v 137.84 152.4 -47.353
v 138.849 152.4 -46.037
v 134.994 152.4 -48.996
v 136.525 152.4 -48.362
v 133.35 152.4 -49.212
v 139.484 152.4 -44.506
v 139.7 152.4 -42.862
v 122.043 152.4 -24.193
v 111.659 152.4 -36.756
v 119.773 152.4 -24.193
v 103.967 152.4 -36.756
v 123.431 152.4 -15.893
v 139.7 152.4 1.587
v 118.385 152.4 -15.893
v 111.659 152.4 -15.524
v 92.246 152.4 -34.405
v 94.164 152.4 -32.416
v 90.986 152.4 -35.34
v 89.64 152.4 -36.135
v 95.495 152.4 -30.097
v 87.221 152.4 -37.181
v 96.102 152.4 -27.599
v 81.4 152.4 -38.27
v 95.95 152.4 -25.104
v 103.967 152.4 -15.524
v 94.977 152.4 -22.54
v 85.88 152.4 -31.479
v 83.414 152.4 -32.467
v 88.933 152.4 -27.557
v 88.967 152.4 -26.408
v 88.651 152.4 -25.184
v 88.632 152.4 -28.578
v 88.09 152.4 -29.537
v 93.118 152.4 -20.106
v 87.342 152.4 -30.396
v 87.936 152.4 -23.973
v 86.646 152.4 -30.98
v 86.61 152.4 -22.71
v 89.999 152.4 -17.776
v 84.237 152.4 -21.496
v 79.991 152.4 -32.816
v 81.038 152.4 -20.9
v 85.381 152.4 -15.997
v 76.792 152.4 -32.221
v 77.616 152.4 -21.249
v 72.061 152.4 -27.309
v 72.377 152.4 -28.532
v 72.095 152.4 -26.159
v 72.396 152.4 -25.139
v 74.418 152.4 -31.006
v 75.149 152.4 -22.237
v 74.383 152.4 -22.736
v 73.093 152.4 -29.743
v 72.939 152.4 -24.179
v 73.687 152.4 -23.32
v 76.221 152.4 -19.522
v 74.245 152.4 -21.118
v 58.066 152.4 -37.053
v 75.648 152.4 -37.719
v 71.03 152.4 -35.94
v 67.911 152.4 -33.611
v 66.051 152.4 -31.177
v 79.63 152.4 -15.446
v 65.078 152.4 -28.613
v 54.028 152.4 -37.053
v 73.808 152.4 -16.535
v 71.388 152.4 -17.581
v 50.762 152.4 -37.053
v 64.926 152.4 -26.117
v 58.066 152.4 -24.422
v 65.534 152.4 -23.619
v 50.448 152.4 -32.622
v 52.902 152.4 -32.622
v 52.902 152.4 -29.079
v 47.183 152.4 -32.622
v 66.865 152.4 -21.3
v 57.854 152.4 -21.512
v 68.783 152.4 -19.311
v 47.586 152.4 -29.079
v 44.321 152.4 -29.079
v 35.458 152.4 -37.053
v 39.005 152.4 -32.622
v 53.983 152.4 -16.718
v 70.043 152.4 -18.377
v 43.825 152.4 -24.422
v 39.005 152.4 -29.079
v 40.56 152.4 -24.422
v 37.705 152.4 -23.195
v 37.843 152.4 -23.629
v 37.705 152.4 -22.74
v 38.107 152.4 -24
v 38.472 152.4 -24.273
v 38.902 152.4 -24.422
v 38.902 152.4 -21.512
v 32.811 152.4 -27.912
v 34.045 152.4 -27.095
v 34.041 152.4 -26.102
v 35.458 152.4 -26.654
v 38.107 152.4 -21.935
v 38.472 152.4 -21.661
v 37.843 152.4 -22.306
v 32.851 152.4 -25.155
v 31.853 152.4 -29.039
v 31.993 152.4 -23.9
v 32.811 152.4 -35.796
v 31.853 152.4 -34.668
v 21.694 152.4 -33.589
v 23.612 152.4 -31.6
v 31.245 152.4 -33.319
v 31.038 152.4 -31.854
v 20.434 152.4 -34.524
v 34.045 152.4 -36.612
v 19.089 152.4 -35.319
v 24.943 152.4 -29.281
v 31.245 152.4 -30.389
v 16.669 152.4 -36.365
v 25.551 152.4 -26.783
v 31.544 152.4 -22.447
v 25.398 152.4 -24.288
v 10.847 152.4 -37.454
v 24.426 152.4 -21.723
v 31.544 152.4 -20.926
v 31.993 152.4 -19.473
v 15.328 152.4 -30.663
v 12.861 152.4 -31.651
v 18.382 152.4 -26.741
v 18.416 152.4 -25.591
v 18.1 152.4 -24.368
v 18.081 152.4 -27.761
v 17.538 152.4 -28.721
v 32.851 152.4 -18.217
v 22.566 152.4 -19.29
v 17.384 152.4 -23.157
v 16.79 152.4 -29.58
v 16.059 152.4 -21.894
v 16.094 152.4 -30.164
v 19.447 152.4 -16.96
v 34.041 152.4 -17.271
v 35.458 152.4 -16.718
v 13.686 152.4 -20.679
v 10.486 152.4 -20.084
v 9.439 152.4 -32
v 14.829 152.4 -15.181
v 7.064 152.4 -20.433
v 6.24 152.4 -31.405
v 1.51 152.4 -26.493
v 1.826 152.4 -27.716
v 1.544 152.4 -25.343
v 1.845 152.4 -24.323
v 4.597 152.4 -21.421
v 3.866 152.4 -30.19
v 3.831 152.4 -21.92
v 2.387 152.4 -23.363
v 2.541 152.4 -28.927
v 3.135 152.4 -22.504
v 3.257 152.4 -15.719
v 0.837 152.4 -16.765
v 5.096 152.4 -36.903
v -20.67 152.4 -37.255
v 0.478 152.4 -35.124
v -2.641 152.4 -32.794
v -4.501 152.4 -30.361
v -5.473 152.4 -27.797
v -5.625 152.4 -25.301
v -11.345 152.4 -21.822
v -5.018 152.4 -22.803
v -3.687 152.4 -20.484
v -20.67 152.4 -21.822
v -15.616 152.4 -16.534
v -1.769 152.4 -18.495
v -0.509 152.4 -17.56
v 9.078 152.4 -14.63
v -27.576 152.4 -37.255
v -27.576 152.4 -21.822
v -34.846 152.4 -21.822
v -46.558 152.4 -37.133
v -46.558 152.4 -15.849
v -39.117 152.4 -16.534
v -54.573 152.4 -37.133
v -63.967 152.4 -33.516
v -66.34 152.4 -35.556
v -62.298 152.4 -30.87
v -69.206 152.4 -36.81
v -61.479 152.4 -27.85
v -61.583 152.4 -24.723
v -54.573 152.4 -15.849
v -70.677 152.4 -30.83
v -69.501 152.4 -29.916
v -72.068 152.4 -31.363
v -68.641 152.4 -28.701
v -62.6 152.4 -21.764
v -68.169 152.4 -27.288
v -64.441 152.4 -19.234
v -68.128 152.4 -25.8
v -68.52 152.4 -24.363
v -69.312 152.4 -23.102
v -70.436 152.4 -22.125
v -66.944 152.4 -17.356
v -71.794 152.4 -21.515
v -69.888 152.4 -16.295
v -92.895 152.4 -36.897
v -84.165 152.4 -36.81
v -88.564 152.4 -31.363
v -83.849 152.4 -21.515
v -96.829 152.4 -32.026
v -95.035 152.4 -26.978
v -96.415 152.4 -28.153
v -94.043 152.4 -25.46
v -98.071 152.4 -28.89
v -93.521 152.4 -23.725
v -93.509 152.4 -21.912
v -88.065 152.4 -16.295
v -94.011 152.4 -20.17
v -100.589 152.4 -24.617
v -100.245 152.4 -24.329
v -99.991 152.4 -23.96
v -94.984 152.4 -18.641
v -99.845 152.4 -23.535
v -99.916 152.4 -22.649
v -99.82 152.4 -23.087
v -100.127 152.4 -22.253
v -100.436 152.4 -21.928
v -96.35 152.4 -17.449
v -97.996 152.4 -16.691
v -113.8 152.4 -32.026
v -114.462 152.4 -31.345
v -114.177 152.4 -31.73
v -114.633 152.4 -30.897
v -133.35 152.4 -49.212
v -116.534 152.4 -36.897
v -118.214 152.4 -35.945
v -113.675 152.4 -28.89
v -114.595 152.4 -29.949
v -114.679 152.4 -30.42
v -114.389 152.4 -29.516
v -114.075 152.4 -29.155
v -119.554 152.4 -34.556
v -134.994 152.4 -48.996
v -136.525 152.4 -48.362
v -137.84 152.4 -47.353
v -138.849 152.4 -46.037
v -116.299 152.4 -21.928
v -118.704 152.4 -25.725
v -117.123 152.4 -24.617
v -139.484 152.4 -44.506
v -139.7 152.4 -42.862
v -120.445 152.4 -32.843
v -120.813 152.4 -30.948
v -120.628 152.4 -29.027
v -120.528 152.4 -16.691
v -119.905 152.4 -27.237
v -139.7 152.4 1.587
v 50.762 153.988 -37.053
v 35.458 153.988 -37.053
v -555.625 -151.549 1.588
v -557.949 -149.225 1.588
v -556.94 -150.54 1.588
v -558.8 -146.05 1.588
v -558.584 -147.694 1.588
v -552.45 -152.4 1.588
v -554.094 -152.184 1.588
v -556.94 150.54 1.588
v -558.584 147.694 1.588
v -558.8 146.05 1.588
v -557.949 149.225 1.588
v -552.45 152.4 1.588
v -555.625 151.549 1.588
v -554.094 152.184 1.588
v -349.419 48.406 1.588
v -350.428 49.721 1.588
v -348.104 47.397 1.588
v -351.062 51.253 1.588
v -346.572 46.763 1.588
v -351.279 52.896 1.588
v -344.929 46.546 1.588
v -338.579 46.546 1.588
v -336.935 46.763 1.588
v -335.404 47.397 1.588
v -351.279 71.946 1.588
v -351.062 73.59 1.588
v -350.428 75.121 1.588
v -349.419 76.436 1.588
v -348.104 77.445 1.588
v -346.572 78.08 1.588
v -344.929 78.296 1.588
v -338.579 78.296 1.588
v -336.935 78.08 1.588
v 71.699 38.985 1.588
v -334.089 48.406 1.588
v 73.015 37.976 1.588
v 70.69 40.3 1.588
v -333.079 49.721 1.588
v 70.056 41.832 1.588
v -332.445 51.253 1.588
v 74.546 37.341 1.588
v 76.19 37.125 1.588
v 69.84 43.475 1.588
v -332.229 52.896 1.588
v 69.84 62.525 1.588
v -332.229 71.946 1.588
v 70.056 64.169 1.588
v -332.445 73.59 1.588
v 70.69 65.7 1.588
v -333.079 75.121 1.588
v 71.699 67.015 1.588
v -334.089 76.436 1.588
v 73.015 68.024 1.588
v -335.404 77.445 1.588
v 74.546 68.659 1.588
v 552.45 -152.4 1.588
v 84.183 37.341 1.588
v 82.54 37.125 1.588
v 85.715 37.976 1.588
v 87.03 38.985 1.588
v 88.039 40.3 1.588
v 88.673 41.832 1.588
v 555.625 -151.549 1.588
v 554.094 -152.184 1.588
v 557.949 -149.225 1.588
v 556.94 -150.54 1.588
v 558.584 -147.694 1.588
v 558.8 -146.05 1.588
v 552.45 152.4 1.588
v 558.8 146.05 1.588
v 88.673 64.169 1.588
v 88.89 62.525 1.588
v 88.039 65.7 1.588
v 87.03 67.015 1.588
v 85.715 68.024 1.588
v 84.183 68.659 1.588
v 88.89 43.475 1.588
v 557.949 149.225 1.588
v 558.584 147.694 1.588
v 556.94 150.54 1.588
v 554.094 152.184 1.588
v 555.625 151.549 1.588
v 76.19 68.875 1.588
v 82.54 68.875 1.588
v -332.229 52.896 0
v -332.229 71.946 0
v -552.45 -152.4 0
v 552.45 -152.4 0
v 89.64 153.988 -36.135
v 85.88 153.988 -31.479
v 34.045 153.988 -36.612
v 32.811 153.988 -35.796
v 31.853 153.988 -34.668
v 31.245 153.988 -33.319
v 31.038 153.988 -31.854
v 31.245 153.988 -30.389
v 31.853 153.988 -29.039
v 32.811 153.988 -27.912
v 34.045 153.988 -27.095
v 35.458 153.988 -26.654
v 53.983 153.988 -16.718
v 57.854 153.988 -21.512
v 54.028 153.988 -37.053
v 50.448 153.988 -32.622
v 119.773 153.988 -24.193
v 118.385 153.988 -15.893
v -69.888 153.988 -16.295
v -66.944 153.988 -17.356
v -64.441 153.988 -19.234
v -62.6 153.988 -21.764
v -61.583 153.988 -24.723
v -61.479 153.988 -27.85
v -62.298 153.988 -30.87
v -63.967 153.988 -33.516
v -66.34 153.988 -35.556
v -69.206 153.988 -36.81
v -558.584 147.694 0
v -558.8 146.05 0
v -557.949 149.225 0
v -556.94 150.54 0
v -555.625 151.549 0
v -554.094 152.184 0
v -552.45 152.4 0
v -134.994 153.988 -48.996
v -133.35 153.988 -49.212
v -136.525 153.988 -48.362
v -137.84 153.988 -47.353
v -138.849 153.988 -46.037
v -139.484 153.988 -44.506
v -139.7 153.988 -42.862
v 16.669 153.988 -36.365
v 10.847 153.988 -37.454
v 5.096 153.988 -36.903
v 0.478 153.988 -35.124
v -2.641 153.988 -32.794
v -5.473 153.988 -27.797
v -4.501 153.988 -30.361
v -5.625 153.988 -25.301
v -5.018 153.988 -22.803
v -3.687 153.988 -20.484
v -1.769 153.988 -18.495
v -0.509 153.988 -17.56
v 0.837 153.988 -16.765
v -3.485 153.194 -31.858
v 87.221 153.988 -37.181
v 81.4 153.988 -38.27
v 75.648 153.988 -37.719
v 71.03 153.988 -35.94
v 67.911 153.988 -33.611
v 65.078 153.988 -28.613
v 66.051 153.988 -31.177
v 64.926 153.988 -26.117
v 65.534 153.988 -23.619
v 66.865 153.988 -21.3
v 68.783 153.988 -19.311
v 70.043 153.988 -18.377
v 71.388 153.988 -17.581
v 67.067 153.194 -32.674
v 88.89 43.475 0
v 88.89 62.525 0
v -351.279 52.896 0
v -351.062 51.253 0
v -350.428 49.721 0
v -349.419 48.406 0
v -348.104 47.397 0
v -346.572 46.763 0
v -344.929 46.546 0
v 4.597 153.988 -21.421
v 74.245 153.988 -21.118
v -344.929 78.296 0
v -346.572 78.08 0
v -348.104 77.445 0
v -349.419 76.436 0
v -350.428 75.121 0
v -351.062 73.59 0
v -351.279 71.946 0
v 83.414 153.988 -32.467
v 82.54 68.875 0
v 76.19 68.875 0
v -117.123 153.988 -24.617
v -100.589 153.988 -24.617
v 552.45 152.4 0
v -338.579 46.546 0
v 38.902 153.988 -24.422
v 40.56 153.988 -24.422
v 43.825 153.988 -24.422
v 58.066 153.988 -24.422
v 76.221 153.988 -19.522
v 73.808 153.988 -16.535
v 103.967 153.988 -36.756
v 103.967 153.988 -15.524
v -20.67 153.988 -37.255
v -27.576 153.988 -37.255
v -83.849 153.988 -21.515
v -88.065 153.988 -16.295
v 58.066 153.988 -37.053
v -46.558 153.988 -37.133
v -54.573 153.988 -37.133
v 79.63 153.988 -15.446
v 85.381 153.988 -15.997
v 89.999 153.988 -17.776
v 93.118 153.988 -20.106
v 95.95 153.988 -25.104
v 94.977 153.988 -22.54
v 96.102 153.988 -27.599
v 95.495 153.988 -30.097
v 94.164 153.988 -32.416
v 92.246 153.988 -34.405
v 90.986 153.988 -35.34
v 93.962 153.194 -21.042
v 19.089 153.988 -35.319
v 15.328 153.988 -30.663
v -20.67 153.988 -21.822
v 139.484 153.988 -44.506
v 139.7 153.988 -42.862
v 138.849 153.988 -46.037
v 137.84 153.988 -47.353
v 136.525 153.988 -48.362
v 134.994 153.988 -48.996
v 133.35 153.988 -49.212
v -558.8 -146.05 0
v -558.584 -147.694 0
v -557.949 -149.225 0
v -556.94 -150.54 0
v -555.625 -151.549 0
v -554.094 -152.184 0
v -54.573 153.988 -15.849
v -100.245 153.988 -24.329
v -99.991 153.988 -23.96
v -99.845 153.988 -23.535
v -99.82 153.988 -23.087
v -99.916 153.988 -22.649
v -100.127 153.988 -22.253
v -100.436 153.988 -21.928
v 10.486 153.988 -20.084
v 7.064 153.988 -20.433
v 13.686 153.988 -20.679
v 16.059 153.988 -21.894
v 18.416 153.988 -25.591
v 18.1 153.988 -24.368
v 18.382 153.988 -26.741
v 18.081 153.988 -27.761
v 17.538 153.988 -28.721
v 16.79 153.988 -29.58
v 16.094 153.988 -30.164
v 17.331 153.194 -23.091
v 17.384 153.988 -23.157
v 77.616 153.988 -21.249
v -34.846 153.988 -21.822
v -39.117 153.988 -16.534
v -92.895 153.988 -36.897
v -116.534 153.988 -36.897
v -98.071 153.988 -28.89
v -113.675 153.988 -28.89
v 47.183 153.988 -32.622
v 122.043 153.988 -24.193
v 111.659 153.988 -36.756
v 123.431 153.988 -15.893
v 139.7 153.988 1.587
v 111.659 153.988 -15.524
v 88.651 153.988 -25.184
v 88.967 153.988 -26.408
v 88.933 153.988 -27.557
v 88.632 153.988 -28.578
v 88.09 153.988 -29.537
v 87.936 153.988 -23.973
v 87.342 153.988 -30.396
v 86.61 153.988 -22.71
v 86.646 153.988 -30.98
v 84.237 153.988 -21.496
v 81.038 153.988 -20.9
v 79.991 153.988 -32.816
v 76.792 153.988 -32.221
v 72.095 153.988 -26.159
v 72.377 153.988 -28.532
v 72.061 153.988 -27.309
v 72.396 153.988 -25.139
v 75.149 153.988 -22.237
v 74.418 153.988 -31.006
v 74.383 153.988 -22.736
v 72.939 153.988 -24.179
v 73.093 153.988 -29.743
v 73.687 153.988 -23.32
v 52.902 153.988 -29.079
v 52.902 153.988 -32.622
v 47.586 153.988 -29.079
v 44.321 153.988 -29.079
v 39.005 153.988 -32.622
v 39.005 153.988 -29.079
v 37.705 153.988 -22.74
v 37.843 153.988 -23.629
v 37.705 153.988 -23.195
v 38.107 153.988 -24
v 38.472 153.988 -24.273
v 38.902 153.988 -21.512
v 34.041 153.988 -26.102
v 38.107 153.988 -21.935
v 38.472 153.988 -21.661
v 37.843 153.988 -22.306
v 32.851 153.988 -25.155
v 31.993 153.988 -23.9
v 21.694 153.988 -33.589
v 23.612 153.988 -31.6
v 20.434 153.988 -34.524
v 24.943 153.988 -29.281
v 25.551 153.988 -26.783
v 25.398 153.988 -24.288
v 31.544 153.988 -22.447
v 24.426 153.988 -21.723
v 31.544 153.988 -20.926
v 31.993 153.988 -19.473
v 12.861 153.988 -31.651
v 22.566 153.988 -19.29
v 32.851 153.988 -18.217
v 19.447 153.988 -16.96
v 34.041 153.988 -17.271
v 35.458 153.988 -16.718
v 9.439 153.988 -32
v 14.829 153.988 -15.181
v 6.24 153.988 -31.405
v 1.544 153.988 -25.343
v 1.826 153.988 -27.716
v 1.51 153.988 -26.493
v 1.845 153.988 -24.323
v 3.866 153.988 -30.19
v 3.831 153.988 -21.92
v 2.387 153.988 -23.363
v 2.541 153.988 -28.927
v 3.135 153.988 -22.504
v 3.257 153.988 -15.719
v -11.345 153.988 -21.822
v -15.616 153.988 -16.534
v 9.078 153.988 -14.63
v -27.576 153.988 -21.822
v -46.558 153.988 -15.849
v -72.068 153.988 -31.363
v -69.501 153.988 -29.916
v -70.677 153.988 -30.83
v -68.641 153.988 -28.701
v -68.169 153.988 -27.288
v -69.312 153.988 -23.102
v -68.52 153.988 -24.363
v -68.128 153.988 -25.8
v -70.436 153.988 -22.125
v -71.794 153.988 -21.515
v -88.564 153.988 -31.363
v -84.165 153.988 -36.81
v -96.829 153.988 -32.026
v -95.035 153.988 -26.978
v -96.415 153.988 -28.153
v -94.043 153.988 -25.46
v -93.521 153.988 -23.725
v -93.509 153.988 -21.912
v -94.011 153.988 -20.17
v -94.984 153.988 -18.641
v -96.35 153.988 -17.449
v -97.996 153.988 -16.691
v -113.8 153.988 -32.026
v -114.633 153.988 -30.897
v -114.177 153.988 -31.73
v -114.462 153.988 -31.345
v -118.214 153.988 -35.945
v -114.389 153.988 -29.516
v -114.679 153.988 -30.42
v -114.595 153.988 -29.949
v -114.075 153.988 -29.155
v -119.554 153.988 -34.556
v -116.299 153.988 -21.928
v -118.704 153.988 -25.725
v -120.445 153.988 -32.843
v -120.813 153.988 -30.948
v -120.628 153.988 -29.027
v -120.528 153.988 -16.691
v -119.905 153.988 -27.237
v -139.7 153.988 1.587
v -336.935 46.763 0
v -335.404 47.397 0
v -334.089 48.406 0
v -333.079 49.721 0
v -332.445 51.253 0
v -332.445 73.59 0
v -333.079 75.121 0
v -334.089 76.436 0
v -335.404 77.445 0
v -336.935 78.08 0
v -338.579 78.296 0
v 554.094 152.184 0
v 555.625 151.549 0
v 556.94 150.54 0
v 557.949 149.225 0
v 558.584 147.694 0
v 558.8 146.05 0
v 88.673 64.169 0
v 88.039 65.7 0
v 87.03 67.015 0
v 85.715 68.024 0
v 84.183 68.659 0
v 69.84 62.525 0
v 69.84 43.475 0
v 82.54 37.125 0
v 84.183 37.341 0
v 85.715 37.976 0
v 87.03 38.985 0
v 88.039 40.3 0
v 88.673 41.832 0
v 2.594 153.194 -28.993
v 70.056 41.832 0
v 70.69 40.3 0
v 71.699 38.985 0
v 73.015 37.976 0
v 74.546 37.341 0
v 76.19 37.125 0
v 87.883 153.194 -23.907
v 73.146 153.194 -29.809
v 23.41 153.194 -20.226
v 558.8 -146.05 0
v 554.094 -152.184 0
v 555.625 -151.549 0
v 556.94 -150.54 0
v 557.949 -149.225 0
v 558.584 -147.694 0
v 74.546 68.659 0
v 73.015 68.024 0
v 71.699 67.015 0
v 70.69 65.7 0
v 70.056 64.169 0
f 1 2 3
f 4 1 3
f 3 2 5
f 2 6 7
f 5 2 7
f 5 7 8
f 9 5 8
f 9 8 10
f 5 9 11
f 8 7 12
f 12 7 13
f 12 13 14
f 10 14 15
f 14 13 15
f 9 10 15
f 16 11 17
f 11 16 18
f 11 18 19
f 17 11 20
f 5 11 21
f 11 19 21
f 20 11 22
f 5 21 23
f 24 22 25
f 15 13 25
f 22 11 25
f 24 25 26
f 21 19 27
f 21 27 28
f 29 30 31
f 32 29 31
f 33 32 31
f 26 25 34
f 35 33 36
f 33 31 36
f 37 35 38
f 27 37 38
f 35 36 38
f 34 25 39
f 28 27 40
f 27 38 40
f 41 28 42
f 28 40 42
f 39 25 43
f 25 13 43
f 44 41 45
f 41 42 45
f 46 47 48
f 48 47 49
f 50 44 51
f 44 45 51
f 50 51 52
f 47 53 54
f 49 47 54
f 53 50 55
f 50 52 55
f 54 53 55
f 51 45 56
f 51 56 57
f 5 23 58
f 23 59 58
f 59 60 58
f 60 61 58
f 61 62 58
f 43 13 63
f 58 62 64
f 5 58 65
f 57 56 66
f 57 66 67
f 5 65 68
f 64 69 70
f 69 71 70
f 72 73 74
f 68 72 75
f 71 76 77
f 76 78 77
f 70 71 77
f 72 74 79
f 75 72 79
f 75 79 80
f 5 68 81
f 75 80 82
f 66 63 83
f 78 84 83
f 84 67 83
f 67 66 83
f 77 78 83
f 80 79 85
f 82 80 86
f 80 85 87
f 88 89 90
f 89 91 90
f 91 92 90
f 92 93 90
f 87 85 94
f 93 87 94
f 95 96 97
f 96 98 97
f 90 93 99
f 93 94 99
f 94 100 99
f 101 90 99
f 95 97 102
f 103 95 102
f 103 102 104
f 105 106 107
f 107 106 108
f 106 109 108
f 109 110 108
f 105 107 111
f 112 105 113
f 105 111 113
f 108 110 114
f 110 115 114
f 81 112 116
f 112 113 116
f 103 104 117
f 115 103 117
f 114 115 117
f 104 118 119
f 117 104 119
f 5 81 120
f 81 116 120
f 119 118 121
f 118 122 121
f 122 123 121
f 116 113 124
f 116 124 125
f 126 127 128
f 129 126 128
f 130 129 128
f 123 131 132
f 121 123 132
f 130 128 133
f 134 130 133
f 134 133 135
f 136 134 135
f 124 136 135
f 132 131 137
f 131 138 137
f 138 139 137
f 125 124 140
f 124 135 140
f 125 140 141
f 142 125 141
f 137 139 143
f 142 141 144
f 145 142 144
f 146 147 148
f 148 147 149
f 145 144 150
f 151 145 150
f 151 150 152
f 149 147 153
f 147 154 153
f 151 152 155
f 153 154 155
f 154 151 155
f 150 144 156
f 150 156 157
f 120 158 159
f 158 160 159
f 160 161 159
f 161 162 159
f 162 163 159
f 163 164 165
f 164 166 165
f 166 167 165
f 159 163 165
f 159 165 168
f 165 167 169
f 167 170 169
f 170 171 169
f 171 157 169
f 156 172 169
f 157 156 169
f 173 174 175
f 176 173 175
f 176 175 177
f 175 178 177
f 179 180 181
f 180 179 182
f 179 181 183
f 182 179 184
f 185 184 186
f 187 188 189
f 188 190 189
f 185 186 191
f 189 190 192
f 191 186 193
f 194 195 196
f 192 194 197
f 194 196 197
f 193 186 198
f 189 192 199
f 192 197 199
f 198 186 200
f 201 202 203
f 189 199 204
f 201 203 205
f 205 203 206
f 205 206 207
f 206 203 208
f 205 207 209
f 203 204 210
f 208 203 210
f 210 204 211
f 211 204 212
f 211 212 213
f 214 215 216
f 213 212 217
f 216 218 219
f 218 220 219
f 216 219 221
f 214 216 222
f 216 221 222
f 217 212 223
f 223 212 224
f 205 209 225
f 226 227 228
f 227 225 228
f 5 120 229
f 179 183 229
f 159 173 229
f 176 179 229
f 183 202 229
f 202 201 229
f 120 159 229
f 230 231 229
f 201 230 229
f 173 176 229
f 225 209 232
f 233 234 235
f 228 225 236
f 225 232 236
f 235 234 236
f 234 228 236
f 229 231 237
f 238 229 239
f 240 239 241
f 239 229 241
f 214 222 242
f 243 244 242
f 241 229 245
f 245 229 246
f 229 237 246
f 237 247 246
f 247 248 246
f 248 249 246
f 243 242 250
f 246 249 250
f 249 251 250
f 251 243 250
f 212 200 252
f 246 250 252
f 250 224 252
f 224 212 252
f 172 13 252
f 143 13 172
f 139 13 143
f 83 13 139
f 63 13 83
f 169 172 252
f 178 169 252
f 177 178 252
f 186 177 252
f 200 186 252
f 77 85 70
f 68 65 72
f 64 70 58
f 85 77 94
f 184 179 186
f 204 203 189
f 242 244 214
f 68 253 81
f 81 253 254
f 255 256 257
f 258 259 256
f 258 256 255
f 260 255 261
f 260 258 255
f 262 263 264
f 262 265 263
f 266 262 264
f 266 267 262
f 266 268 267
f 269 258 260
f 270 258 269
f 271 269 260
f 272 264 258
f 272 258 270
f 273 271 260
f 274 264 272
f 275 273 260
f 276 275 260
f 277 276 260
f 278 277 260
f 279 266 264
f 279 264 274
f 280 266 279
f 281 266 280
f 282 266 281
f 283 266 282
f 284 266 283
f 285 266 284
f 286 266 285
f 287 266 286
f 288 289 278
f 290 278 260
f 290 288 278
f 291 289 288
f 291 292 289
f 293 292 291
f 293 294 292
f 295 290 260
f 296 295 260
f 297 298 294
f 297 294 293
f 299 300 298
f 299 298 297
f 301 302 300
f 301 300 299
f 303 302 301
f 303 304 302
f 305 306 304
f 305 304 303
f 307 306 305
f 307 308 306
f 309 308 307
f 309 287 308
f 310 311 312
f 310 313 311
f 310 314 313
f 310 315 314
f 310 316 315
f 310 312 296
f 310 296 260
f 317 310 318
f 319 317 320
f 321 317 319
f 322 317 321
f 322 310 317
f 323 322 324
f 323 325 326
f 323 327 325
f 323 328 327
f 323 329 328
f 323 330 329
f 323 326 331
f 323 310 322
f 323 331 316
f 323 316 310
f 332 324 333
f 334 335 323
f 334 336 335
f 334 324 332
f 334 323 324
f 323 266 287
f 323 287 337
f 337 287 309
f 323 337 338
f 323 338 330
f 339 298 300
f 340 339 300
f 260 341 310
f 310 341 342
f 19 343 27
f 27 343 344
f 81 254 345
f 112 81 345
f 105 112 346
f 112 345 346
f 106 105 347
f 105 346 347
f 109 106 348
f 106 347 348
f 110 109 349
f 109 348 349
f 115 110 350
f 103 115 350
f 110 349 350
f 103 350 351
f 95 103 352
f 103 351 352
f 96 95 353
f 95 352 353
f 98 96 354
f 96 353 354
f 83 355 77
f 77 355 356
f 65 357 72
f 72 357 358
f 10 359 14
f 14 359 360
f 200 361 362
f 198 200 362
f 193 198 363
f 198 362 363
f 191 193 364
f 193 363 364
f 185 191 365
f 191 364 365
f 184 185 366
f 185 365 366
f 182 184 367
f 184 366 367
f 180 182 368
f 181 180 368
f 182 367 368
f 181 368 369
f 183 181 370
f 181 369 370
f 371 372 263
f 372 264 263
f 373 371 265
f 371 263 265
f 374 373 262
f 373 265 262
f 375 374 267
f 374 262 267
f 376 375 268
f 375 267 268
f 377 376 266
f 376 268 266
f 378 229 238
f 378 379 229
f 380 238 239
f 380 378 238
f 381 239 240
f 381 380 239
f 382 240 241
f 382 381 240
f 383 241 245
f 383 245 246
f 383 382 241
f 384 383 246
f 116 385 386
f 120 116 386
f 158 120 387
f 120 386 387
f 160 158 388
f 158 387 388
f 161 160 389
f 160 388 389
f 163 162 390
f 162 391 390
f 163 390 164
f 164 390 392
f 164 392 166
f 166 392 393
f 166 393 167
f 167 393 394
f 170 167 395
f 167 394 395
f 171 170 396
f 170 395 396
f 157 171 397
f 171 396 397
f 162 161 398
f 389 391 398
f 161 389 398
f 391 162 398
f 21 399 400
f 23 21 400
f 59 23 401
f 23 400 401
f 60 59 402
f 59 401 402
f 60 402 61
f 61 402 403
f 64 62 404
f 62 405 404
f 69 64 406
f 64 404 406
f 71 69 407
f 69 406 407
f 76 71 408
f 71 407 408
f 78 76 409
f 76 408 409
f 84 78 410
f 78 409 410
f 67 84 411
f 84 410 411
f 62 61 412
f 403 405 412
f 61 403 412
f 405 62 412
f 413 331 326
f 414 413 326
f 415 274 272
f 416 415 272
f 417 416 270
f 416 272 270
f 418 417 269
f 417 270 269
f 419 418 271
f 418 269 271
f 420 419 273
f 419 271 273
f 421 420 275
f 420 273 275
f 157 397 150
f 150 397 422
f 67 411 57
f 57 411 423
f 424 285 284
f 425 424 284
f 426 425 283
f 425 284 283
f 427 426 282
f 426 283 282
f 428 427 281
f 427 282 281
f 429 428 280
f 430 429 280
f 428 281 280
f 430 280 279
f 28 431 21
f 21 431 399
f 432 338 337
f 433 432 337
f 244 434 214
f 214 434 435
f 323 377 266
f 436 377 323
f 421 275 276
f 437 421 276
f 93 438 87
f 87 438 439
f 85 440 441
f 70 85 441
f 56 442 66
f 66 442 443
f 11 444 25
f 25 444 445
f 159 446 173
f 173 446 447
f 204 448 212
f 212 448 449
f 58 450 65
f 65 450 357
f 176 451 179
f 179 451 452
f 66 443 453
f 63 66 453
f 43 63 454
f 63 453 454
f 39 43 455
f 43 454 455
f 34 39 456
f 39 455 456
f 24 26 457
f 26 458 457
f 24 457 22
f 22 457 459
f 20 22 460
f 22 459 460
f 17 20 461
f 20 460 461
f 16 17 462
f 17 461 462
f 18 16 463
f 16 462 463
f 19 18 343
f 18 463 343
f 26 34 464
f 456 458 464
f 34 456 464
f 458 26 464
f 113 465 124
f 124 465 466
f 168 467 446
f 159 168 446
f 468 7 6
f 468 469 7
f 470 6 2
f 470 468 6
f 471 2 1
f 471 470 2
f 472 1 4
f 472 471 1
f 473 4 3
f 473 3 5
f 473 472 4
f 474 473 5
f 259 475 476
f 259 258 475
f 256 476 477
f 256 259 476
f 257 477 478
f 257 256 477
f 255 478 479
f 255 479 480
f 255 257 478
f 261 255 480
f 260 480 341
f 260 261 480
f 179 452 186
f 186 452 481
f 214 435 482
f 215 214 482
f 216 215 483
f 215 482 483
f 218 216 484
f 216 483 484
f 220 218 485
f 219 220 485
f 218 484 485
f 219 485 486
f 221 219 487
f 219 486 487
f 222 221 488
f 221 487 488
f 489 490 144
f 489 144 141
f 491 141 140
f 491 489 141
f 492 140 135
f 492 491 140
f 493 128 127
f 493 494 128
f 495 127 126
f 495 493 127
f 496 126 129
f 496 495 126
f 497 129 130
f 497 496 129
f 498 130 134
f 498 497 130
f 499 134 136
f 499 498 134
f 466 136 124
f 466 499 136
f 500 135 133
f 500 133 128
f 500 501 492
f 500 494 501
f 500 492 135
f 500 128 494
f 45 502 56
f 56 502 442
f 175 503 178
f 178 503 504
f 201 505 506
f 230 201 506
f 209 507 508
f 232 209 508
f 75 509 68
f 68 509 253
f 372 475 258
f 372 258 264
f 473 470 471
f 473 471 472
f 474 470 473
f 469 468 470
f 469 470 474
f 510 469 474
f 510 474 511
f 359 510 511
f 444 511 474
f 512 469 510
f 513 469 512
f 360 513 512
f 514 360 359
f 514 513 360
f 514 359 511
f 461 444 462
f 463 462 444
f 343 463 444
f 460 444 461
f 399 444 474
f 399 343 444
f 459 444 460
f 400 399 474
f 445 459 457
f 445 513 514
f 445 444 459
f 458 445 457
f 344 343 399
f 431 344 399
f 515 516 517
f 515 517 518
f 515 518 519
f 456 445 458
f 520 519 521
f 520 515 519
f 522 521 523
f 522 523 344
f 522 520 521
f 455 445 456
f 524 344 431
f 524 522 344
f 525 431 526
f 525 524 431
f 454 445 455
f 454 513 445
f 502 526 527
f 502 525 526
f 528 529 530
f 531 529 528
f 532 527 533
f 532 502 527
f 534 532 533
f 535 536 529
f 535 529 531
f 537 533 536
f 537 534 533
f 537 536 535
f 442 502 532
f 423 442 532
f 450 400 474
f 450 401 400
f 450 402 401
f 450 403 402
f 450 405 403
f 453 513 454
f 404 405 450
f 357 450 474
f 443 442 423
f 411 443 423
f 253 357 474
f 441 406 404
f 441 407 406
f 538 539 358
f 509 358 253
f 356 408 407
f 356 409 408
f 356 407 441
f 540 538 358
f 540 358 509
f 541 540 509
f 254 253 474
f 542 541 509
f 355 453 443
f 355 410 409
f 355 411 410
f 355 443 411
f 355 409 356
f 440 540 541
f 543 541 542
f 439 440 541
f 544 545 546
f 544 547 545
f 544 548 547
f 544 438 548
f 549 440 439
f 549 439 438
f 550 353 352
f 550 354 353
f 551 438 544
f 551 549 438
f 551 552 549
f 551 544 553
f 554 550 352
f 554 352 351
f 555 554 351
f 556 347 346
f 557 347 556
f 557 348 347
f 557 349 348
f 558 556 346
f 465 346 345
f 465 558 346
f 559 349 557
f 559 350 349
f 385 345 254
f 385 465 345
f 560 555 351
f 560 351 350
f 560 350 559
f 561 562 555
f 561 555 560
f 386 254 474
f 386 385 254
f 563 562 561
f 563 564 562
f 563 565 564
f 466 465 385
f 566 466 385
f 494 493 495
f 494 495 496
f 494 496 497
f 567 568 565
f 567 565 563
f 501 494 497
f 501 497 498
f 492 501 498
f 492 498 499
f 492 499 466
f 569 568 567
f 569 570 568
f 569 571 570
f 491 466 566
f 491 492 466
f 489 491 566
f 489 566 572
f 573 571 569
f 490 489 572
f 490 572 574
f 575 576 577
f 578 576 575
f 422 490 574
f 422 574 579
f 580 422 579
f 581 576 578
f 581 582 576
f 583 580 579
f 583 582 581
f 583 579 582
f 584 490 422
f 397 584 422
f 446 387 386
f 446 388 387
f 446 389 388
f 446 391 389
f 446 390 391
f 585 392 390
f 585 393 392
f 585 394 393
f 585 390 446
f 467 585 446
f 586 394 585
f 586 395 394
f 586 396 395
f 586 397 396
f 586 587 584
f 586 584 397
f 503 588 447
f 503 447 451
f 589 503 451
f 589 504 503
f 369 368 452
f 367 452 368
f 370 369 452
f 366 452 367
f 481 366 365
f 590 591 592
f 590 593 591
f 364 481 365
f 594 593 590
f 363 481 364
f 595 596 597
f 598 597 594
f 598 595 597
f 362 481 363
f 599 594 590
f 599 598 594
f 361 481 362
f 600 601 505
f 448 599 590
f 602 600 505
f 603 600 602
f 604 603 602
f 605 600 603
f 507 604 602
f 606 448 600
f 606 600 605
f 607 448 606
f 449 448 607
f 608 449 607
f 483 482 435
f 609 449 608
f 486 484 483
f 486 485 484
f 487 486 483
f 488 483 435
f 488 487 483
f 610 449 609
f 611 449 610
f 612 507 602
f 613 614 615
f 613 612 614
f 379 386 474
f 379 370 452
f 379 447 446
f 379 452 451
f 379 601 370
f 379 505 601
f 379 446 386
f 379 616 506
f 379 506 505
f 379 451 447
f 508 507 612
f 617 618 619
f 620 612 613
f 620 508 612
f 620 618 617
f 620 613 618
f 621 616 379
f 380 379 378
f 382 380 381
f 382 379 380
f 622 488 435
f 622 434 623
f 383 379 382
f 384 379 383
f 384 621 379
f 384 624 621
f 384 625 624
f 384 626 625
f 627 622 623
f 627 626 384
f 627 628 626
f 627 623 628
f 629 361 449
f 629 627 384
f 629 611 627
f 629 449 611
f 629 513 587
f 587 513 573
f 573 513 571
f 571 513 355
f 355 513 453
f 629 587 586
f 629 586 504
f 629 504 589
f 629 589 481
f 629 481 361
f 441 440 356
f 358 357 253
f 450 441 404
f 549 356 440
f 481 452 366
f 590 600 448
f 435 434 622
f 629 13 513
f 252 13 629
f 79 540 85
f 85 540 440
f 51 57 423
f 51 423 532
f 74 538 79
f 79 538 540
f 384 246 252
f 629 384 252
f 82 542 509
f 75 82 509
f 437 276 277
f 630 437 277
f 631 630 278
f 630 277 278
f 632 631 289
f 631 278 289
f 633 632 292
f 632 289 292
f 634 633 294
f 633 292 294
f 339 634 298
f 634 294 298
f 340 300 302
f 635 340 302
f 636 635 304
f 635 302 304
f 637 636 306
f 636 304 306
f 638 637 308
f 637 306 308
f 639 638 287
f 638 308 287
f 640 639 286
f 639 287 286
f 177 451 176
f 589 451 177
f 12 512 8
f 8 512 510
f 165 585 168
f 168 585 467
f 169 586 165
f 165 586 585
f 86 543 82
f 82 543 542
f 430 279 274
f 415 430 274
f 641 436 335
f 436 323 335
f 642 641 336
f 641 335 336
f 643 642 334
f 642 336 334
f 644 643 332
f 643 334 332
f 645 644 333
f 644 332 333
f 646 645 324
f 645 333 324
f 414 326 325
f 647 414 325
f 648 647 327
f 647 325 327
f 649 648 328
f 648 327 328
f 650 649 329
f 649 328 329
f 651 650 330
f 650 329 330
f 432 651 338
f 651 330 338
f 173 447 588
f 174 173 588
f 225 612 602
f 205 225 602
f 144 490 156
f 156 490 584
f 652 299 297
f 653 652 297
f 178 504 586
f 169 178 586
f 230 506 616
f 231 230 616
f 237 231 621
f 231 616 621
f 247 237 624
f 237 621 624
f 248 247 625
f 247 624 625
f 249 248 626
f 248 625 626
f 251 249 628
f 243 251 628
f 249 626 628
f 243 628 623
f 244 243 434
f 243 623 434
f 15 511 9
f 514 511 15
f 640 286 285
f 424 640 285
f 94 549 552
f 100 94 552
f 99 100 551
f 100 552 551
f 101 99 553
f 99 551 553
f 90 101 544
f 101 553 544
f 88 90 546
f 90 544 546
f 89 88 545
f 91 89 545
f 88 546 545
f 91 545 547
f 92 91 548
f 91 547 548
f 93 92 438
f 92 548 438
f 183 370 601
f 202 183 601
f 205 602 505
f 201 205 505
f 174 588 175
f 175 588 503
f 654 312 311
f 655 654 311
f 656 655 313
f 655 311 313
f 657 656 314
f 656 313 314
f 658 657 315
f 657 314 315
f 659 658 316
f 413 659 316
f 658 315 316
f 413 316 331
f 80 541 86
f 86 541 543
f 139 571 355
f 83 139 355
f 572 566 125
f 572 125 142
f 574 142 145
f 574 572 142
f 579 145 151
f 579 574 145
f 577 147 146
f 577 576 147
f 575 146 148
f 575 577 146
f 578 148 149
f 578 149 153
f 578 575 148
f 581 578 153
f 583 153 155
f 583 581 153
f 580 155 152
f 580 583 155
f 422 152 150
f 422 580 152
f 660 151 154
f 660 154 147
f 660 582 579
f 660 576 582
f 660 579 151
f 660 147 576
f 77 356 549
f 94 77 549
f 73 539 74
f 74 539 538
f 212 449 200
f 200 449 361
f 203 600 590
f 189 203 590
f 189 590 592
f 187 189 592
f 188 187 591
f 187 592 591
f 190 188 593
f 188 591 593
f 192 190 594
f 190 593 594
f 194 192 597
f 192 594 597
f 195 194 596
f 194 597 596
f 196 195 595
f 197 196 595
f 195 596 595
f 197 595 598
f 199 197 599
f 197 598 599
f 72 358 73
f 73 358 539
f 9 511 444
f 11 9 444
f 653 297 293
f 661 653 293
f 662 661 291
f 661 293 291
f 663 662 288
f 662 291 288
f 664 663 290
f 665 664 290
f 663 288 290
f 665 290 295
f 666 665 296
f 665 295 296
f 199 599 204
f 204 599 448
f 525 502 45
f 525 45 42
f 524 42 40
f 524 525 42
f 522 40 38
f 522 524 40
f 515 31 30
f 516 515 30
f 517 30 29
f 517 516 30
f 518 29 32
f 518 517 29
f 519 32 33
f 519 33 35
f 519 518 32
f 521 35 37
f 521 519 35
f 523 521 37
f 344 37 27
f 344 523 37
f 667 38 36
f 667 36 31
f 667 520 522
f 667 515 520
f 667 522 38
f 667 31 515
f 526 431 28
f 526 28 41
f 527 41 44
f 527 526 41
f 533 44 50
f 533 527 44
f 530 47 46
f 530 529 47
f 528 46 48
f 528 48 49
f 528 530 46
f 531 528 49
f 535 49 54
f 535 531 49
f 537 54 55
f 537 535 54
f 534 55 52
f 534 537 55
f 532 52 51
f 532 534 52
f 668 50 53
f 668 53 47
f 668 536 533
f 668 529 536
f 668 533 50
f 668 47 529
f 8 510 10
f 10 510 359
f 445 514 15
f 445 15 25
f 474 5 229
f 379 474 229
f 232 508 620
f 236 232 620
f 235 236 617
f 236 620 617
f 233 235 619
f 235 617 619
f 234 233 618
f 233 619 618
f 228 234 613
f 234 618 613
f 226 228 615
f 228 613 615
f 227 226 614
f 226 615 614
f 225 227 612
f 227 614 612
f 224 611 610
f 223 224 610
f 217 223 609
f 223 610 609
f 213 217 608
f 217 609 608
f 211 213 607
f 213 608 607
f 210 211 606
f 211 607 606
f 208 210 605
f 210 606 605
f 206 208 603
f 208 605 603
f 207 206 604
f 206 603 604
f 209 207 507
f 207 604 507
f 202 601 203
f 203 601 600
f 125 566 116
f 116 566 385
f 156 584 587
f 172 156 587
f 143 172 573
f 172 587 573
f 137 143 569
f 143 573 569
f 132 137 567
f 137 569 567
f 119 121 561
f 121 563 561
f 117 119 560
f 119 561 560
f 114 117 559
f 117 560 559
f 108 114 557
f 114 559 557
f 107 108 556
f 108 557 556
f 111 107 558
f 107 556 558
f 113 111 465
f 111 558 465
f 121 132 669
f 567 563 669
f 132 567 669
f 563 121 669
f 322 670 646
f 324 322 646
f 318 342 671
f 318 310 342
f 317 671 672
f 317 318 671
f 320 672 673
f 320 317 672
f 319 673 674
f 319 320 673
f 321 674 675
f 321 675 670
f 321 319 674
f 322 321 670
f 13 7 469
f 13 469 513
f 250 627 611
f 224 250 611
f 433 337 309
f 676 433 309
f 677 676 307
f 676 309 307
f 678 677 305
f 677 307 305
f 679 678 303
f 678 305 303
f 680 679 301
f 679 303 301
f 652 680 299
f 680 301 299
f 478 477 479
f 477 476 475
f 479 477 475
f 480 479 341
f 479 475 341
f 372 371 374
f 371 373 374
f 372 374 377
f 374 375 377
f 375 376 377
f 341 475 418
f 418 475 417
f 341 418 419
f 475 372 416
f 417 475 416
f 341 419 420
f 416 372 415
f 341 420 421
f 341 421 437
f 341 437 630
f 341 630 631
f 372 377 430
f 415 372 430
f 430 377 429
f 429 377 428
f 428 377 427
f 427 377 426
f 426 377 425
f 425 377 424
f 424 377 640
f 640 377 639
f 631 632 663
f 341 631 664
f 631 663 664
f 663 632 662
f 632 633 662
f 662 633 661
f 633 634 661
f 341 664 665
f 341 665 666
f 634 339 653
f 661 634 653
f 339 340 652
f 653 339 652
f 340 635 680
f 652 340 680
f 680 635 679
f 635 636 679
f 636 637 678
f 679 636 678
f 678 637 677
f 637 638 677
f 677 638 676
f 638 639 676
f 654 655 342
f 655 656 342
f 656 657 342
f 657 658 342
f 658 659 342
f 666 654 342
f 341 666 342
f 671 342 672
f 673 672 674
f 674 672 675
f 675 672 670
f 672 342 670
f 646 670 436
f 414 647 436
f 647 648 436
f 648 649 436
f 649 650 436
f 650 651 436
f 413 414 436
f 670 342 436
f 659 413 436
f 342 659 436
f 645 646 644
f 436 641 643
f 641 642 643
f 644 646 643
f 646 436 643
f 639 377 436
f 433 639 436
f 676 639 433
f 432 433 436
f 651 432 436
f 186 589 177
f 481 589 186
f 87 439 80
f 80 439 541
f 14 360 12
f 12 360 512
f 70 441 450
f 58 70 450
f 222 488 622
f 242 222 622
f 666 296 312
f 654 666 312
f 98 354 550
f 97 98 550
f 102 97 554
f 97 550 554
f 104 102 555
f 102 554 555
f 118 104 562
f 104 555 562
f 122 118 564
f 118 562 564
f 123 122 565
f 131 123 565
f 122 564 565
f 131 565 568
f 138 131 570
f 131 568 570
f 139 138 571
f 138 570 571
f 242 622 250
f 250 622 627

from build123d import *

# Parameters (mm, degrees)
F0_W     = 1117.6
F0_H     = 304.8
F1_DEPTH = 1.5875
F4_DEPTH = 1.5875
F5_W     = 279.4
F5_H     = 50.8
F6_DEPTH = 1.5875
F7_W     = 7.6921805739
F7_H     = 21.2329626083
F7_W_2   = 8.0148763955
F7_H_2   = 21.2832065299
F8_DEPTH = 1.5875
F9_R     = 6.35
F10_R    = 6.35


with BuildPart() as f1:
    # F0 (on Top) → F1 (new body)
    with BuildSketch(Plane.XY):
        Rectangle(F0_W, F0_H)
    extrude(amount=F1_DEPTH)

    # F3 (on face) → F4 (cut, through all)
    with BuildSketch(Plane.XY.offset(1.5875)):
        with BuildLine():
            ThreePointArc((-332.2286445189, 71.9461765826), (-334.0885164583, 76.4363046431), (-338.5786445189, 78.2961765826))
            Line((-338.5786445189, 78.2961765826), (-344.9286445189, 78.2961765826))
            ThreePointArc((-344.9286445189, 78.2961765826), (-349.4187725794, 76.4363046431), (-351.2786445189, 71.9461765826))
            Line((-351.2786445189, 71.9461765826), (-351.2786445189, 52.8961765826))
            ThreePointArc((-351.2786445189, 52.8961765826), (-349.4187725794, 48.406048522), (-344.9286445189, 46.5461765826))
            Line((-344.9286445189, 46.5461765826), (-338.5786445189, 46.5461765826))
            ThreePointArc((-338.5786445189, 46.5461765826), (-334.0885164583, 48.406048522), (-332.2286445189, 52.8961765826))
            Line((-332.2286445189, 52.8961765826), (-332.2286445189, 71.9461765826))
        make_face()
        with BuildLine():
            ThreePointArc((88.8895047712, 62.5250180006), (87.0296328318, 67.0151460611), (82.5395047712, 68.8750180006))
            Line((82.5395047712, 68.8750180006), (76.1895047712, 68.8750180006))
            ThreePointArc((76.1895047712, 68.8750180006), (71.6993767107, 67.0151460611), (69.8395047712, 62.5250180006))
            Line((69.8395047712, 62.5250180006), (69.8395047712, 43.4750180006))
            ThreePointArc((69.8395047712, 43.4750180006), (71.6993767107, 38.9848899401), (76.1895047712, 37.1250180006))
            Line((76.1895047712, 37.1250180006), (82.5395047712, 37.1250180006))
            ThreePointArc((82.5395047712, 37.1250180006), (87.0296328318, 38.9848899401), (88.8895047712, 43.4750180006))
            Line((88.8895047712, 43.4750180006), (88.8895047712, 62.5250180006))
        make_face()
    extrude(amount=-F4_DEPTH, mode=Mode.SUBTRACT)

    # F9
    f9_edges = [f1.edges().sort_by_distance(p)[0] for p in [
        (-558.8, 152.4, 0.79375),
        (-558.8, -152.4, 0.79375),
        (558.8, -152.4, 0.79375),
        (558.8, 152.4, 0.79375),
    ]]
    fillet(f9_edges, radius=F9_R)


with BuildPart() as f6:
    # F5 (on face) → F6 (new body)
    with BuildSketch(Plane(origin=(0, 152.4, 0), x_dir=(-1, 0, 0), z_dir=(0, 1, 0))):
        with Locations((0, -23.8125)):
            Rectangle(F5_W, F5_H)
    extrude(amount=F6_DEPTH)

    # F7 (on face) → F8 (cut, through all)
    with BuildSketch(Plane(origin=(0, 153.9875, 0), x_dir=(-1, 0, 0), z_dir=(0, 1, 0))):
        with Locations((-107.8125946224, -26.140011847)):
            Rectangle(F7_W, F7_H)
        with Locations((50.5657698959, -26.4909188263)):
            Rectangle(F7_W_2, F7_H_2)
        Polygon((15.6161780773, -16.5343257309), (11.345320064, -21.8221128576), (20.6704313489, -21.8221128576), (20.6704313489, -37.2552846216), (27.5760559918, -37.2552846216), (27.5760559918, -21.8221128576), (34.8457988905, -21.8221128576), (39.1166569037, -16.5343257309), align=None)
        with BuildLine():
            ThreePointArc((72.0678533702, -31.3631950064), (68.0938128502, -26.5456644123), (71.7942922101, -21.5149535692))
            Line((71.7942922101, -21.5149535692), (83.8493555784, -21.5149535692))
            Line((83.8493555784, -21.5149535692), (88.0654709206, -16.2949438283))
            Line((88.0654709206, -16.2949438283), (69.8876163302, -16.2949438283))
            ThreePointArc((69.8876163302, -16.2949438283), (61.4146525621, -26.2823715543), (69.2063038489, -36.8099542694))
            Line((69.2063038489, -36.8099542694), (84.1651437122, -36.8099542694))
            Line((84.1651437122, -36.8099542694), (88.5644008848, -31.3631950064))
            Line((88.5644008848, -31.3631950064), (72.0678533702, -31.3631950064))
        make_face()
        with BuildLine():
            Line((100.4359583746, -21.9276892464), (116.2991094271, -21.9276892464))
            Line((116.2991094271, -21.9276892464), (120.5284183432, -16.6913444247))
            Line((120.5284183432, -16.6913444247), (97.9962427114, -16.6913444247))
            ThreePointArc((97.9962427114, -16.6913444247), (93.4500087631, -22.8189209197), (98.071386208, -28.8900252118))
            Line((98.071386208, -28.8900252118), (113.6753311597, -28.8900252118))
            ThreePointArc((113.6753311597, -28.8900252118), (114.6787088324, -30.4204284293), (113.8000534429, -32.0256902361))
            Line((113.8000534429, -32.0256902361), (96.8292273228, -32.0256902361))
            Line((96.8292273228, -32.0256902361), (92.894671083, -36.897099159))
            Line((92.894671083, -36.897099159), (116.5341868674, -36.897099159))
            ThreePointArc((116.5341868674, -36.897099159), (120.81294988, -30.948320822), (117.1234983419, -24.6171500007))
            Line((117.1234983419, -24.6171500007), (100.5890439474, -24.6171500007))
            ThreePointArc((100.5890439474, -24.6171500007), (99.817425927, -23.3119836849), (100.4359583746, -21.9276892464))
        make_face()
        Polygon((-118.3852031827, -15.8932730556), (-123.4309002757, -15.8932730556), (-122.0433339477, -24.19343777), (-119.7727695107, -24.19343777), align=None)
        with BuildLine():
            Line((-77.6159058593, -21.2487914891), (-76.2207364111, -19.5215903332))
            Line((-76.2207364111, -19.5215903332), (-73.808219203, -16.5349262289))
            add(Edge.make_bspline(
                [(-73.808219203, -16.5349262289), (-86.6994594435, -12.0513294505), (-93.9620299727, -21.0422948339), (-101.2246005019, -30.0332602173), (-89.6402036123, -36.1347116218)],
                knots=[1.1270794679, 1.1270794679, 1.1270794679, 2.6077828375, 2.6077828375, 4.0884862072, 4.0884862072, 4.0884862072], degree=2, weights=[1, 0.7382313762, 1, 0.7382313762, 1]))
            Line((-89.6402036123, -36.1347116218), (-85.8797714716, -31.4793468212))
            add(Edge.make_bspline(
                [(-77.6159058593, -21.2487914891), (-84.343637189, -19.5252853377), (-87.8830677218, -23.9070530974), (-91.4224982546, -28.2888208571), (-85.8797714716, -31.4793468212)],
                knots=[1.221854975, 1.221854975, 1.221854975, 2.6244589809, 2.6244589809, 4.0270629868, 4.0270629868, 4.0270629868], degree=2, weights=[1, 0.7640027659, 1, 0.7640027659, 1]))
        make_face()
        with BuildLine():
            add(Edge.make_bspline(
                [(-83.4135049225, -32.4671447272), (-76.6856765422, -34.1912158775), (-73.1457519624, -29.8093498385), (-69.6058273825, -25.4274837995), (-75.1488372082, -22.2367949093)],
                knots=[4.3633469407, 4.3633469407, 4.3633469407, 5.7660012905, 5.7660012905, 7.1686556404, 7.1686556404, 7.1686556404], degree=2, weights=[1, 0.7639865244, 1, 0.7639865244, 1]))
            Line((-83.4135049225, -32.4671447272), (-87.2211452444, -37.1809526261))
            add(Edge.make_bspline(
                [(-87.2211452444, -37.1809526261), (-74.3298865837, -41.665175297), (-67.0667916039, -32.6741104521), (-59.8036966241, -23.6830456072), (-71.3884050675, -17.5814301087)],
                knots=[4.2686185518, 4.2686185518, 4.2686185518, 5.7493487063, 5.7493487063, 7.2300788608, 7.2300788608, 7.2300788608], degree=2, weights=[1, 0.7382223424, 1, 0.7382223424, 1]))
            Line((-71.3884050675, -17.5814301087), (-74.2448342385, -21.1176512983))
            Line((-74.2448342385, -21.1176512983), (-75.1488372082, -22.2367949093))
        make_face()
        with BuildLine():
            add(Edge.make_bspline(
                [(-12.8610140376, -31.6513067751), (-6.1332827079, -33.3748129265), (-2.5938521751, -28.9930451668), (0.9455783577, -24.6112774071), (-4.5971484253, -21.420751443)],
                knots=[4.3634476286, 4.3634476286, 4.3634476286, 5.7660516345, 5.7660516345, 7.1686556404, 7.1686556404, 7.1686556404], degree=2, weights=[1, 0.7640027659, 1, 0.7640027659, 1]))
            Line((-12.8610140376, -31.6513067751), (-16.6687006939, -36.3651720353))
            add(Edge.make_bspline(
                [(-16.6687006939, -36.3651720353), (-3.7774604534, -40.8487688137), (3.4851100758, -31.8578034303), (10.747680605, -22.8668380469), (-0.8367162846, -16.7653866424)],
                knots=[4.2686721215, 4.2686721215, 4.2686721215, 5.7493754911, 5.7493754911, 7.2300788608, 7.2300788608, 7.2300788608], degree=2, weights=[1, 0.7382313762, 1, 0.7382313762, 1]))
            Line((-0.8367162846, -16.7653866424), (-4.5971484253, -21.420751443))
        make_face()
        with BuildLine():
            add(Edge.make_bspline(
                [(-7.0642170764, -20.4327480228), (-13.7919484061, -18.7092418714), (-17.3313789389, -23.0910096311), (-20.8708094718, -27.4727773908), (-15.3280826887, -30.6633033549)],
                knots=[1.221854975, 1.221854975, 1.221854975, 2.6244589809, 2.6244589809, 4.0270629868, 4.0270629868, 4.0270629868], degree=2, weights=[1, 0.7640027659, 1, 0.7640027659, 1]))
            Line((-7.0642170764, -20.4327480228), (-3.2565304201, -15.7188827626))
            add(Edge.make_bspline(
                [(-3.2565304201, -15.7188827626), (-16.1477706606, -11.2352859842), (-23.4103411899, -20.2262513676), (-30.6729117191, -29.217216751), (-19.0885148294, -35.3186681555)],
                knots=[1.1270794679, 1.1270794679, 1.1270794679, 2.6077828375, 2.6077828375, 4.0884862072, 4.0884862072, 4.0884862072], degree=2, weights=[1, 0.7382313762, 1, 0.7382313762, 1]))
            Line((-19.0885148294, -35.3186681555), (-15.3280826887, -30.6633033549))
        make_face()
        Polygon((-43.8248337577, -24.4223866612), (-58.0655261874, -24.4223866612), (-58.0655261874, -37.0531752706), (-54.0275193653, -37.0531752706), (-50.4478785142, -32.6216276735), (-52.9023818672, -32.6216276735), (-52.9023818672, -29.0788020939), (-47.5861145603, -29.0788020939), align=None)
        with BuildLine():
            Line((-39.0047058463, -29.0788020939), (-39.0047058463, -32.6216276735))
            ThreePointArc((-39.0047058463, -32.6216276735), (-37.8005066226, -30.8502148837), (-39.0047058463, -29.0788020939))
        make_face()
        with BuildLine():
            ThreePointArc((-39.0047058463, -29.0788020939), (-37.8005066226, -30.8502148837), (-39.0047058463, -32.6216276735))
            Line((-39.0047058463, -32.6216276735), (-47.1827371071, -32.6216276735))
            Line((-47.1827371071, -32.6216276735), (-50.7623779582, -37.0531752706))
            Line((-50.7623779582, -37.0531752706), (-38.9020442963, -37.0531752706))
            Line((-38.9020442963, -37.0531752706), (-35.4579761624, -37.0531752706))
            ThreePointArc((-35.4579761624, -37.0531752706), (-31.0376459329, -31.8538295105), (-35.4579761624, -26.6544837505))
            ThreePointArc((-35.4579761624, -26.6544837505), (-31.486812653, -21.6863900423), (-35.4579761624, -16.7182963341))
            Line((-35.4579761624, -16.7182963341), (-53.9826392531, -16.7182963341))
            Line((-53.9826392531, -16.7182963341), (-57.8544649968, -21.5120380744))
            Line((-57.8544649968, -21.5120380744), (-38.9020442963, -21.5120380744))
            ThreePointArc((-38.9020442963, -21.5120380744), (-37.687207755, -22.9672123678), (-38.9020442963, -24.4223866612))
            Line((-38.9020442963, -24.4223866612), (-40.5596923506, -24.4223866612))
            Line((-40.5596923506, -24.4223866612), (-44.3209731532, -29.0788020939))
            Line((-44.3209731532, -29.0788020939), (-39.0047058463, -29.0788020939))
        make_face()
    extrude(amount=-F8_DEPTH, mode=Mode.SUBTRACT)

    # F10
    f10_edges = [f6.edges().sort_by_distance(p)[0] for p in [
        (-139.7, 153.19375, -49.2125),
        (139.7, 153.19375, -49.2125),
    ]]
    fillet(f10_edges, radius=F10_R)


solid = Compound([f1.part, f6.part])
